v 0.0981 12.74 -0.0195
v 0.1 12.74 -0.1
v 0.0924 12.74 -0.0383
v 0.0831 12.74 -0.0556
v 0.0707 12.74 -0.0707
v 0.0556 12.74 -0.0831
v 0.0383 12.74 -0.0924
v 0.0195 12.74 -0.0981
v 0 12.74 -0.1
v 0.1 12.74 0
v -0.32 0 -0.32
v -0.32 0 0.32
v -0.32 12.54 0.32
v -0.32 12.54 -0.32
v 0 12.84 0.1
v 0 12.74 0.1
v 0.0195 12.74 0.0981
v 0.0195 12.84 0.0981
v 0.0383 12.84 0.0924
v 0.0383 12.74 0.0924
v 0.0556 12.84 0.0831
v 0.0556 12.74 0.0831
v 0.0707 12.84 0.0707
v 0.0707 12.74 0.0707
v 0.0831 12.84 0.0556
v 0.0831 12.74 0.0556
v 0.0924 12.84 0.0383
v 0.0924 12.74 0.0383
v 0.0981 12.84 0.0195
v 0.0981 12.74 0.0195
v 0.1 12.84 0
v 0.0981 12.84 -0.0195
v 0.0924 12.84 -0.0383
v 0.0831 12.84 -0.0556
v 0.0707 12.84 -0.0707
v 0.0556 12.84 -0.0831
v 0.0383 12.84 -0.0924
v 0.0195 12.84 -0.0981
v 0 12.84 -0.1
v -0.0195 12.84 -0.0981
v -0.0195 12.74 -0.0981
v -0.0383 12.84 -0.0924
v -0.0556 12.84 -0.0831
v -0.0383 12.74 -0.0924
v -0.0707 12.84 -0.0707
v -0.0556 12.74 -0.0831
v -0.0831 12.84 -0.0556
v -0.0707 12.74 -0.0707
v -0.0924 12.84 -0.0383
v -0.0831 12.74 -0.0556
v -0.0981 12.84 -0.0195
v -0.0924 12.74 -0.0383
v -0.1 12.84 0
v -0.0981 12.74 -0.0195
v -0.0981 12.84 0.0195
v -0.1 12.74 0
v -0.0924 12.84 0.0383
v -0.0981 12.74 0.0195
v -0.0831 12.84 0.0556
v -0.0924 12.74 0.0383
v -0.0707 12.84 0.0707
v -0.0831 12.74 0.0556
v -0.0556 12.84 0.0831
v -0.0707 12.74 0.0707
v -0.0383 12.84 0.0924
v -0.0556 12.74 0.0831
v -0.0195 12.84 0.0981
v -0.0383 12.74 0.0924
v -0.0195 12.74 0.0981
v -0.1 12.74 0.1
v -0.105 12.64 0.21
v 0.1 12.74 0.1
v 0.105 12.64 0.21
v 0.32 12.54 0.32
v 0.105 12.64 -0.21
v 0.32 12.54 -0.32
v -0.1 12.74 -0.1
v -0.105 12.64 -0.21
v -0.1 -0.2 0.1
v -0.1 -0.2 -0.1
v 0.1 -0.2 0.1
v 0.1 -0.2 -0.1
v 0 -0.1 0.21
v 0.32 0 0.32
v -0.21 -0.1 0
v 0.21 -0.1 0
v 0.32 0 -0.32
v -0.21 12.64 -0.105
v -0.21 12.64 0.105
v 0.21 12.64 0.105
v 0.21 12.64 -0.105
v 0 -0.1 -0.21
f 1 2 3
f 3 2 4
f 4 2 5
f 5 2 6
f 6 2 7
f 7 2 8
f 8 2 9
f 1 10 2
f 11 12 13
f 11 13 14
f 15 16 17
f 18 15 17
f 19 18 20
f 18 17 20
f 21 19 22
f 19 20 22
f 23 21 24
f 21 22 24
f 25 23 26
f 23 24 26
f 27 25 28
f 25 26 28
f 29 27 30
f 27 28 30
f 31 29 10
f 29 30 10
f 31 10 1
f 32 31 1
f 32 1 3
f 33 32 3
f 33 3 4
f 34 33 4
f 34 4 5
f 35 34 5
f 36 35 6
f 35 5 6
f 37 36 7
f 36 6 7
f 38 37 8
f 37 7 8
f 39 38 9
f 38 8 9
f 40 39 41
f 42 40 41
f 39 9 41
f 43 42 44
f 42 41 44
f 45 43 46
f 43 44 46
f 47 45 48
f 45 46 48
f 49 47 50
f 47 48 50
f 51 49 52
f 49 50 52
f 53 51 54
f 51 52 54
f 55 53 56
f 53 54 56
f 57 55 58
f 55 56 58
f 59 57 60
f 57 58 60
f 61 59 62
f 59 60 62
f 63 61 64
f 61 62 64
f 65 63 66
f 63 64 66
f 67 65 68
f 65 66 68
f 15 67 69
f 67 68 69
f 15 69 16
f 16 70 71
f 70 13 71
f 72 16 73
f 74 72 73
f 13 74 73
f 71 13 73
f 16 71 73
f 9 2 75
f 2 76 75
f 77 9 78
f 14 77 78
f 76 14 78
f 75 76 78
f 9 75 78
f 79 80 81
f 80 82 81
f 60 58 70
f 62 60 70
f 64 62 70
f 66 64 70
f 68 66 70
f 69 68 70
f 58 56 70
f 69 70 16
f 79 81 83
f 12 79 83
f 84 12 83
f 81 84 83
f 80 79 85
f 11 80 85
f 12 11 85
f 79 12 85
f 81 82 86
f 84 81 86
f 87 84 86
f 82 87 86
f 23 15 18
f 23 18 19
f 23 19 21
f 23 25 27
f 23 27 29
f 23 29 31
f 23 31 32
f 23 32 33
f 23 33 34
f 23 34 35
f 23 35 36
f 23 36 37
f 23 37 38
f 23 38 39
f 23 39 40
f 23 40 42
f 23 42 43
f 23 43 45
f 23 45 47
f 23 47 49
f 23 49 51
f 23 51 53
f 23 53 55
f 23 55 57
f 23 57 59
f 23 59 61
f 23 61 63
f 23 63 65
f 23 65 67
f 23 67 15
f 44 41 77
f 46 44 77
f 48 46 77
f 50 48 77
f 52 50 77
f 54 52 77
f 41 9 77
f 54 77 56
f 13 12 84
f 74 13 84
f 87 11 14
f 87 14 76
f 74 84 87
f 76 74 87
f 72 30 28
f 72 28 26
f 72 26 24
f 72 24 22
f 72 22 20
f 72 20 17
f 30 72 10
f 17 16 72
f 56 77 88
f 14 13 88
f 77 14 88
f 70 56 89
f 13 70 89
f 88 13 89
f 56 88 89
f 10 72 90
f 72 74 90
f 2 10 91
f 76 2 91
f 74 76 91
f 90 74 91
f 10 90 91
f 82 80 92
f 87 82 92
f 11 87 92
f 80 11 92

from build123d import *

# Parameters (mm, degrees)
SKETCH1_W           = 0.64
SKETCH1_H           = 0.64
BOSS_EXTRUDE1_DEPTH = 12.54
SKETCH5_R           = 0.1
BOSS_EXTRUDE2_DEPTH = 0.1


with BuildPart() as part:
    # Sketch1 → Boss-Extrude1 (new body)
    with BuildSketch(Plane(origin=(0, 0, 0), x_dir=(1, 0, 0), z_dir=(0, 1, 0))):
        Rectangle(SKETCH1_W, SKETCH1_H)
    extrude(amount=BOSS_EXTRUDE1_DEPTH)

    # Sketch3 → section 0 of loft1
    with BuildSketch(Plane(origin=(0, 12.74, 0), x_dir=(1, 0, 0), z_dir=(0, 1, 0)), mode=Mode.PRIVATE) as loft1_s0:
        with BuildLine():
            Line((0.1, 0.1), (-0.1, 0.1))
            Line((-0.1, 0.1), (-0.1, -0.1))
            Line((-0.1, -0.1), (0.1, -0.1))
            Line((0.1, -0.1), (0.1, 0.1))
        make_face()
    # loft up to a face of the part (loft1)
    loft([loft1_s0.sketch, part.faces().sort_by_distance((0, 12.54, 0))[0]])

    # Sketch4 → section 0 of loft2
    with BuildSketch(Plane(origin=(0, -0.2, 0), x_dir=(-1, 0, 0), z_dir=(0, -1, 0)), mode=Mode.PRIVATE) as loft2_s0:
        with BuildLine():
            Line((0.1, 0.1), (-0.1, 0.1))
            Line((-0.1, 0.1), (-0.1, -0.1))
            Line((-0.1, -0.1), (0.1, -0.1))
            Line((0.1, -0.1), (0.1, 0.1))
        make_face()
    # loft up to a face of the part (loft2)
    loft([loft2_s0.sketch, part.faces().sort_by_distance((0, 0, 0))[0]])

    # Sketch5 → Boss-Extrude2 (add)
    with BuildSketch(Plane(origin=(0, 12.74, 0), x_dir=(1, 0, 0), z_dir=(0, 1, 0))):
        with Locations(Location((0, 0, 0), (0, 0, 270))):
            Circle(SKETCH5_R)
    extrude(amount=BOSS_EXTRUDE2_DEPTH)


solid = part.part
